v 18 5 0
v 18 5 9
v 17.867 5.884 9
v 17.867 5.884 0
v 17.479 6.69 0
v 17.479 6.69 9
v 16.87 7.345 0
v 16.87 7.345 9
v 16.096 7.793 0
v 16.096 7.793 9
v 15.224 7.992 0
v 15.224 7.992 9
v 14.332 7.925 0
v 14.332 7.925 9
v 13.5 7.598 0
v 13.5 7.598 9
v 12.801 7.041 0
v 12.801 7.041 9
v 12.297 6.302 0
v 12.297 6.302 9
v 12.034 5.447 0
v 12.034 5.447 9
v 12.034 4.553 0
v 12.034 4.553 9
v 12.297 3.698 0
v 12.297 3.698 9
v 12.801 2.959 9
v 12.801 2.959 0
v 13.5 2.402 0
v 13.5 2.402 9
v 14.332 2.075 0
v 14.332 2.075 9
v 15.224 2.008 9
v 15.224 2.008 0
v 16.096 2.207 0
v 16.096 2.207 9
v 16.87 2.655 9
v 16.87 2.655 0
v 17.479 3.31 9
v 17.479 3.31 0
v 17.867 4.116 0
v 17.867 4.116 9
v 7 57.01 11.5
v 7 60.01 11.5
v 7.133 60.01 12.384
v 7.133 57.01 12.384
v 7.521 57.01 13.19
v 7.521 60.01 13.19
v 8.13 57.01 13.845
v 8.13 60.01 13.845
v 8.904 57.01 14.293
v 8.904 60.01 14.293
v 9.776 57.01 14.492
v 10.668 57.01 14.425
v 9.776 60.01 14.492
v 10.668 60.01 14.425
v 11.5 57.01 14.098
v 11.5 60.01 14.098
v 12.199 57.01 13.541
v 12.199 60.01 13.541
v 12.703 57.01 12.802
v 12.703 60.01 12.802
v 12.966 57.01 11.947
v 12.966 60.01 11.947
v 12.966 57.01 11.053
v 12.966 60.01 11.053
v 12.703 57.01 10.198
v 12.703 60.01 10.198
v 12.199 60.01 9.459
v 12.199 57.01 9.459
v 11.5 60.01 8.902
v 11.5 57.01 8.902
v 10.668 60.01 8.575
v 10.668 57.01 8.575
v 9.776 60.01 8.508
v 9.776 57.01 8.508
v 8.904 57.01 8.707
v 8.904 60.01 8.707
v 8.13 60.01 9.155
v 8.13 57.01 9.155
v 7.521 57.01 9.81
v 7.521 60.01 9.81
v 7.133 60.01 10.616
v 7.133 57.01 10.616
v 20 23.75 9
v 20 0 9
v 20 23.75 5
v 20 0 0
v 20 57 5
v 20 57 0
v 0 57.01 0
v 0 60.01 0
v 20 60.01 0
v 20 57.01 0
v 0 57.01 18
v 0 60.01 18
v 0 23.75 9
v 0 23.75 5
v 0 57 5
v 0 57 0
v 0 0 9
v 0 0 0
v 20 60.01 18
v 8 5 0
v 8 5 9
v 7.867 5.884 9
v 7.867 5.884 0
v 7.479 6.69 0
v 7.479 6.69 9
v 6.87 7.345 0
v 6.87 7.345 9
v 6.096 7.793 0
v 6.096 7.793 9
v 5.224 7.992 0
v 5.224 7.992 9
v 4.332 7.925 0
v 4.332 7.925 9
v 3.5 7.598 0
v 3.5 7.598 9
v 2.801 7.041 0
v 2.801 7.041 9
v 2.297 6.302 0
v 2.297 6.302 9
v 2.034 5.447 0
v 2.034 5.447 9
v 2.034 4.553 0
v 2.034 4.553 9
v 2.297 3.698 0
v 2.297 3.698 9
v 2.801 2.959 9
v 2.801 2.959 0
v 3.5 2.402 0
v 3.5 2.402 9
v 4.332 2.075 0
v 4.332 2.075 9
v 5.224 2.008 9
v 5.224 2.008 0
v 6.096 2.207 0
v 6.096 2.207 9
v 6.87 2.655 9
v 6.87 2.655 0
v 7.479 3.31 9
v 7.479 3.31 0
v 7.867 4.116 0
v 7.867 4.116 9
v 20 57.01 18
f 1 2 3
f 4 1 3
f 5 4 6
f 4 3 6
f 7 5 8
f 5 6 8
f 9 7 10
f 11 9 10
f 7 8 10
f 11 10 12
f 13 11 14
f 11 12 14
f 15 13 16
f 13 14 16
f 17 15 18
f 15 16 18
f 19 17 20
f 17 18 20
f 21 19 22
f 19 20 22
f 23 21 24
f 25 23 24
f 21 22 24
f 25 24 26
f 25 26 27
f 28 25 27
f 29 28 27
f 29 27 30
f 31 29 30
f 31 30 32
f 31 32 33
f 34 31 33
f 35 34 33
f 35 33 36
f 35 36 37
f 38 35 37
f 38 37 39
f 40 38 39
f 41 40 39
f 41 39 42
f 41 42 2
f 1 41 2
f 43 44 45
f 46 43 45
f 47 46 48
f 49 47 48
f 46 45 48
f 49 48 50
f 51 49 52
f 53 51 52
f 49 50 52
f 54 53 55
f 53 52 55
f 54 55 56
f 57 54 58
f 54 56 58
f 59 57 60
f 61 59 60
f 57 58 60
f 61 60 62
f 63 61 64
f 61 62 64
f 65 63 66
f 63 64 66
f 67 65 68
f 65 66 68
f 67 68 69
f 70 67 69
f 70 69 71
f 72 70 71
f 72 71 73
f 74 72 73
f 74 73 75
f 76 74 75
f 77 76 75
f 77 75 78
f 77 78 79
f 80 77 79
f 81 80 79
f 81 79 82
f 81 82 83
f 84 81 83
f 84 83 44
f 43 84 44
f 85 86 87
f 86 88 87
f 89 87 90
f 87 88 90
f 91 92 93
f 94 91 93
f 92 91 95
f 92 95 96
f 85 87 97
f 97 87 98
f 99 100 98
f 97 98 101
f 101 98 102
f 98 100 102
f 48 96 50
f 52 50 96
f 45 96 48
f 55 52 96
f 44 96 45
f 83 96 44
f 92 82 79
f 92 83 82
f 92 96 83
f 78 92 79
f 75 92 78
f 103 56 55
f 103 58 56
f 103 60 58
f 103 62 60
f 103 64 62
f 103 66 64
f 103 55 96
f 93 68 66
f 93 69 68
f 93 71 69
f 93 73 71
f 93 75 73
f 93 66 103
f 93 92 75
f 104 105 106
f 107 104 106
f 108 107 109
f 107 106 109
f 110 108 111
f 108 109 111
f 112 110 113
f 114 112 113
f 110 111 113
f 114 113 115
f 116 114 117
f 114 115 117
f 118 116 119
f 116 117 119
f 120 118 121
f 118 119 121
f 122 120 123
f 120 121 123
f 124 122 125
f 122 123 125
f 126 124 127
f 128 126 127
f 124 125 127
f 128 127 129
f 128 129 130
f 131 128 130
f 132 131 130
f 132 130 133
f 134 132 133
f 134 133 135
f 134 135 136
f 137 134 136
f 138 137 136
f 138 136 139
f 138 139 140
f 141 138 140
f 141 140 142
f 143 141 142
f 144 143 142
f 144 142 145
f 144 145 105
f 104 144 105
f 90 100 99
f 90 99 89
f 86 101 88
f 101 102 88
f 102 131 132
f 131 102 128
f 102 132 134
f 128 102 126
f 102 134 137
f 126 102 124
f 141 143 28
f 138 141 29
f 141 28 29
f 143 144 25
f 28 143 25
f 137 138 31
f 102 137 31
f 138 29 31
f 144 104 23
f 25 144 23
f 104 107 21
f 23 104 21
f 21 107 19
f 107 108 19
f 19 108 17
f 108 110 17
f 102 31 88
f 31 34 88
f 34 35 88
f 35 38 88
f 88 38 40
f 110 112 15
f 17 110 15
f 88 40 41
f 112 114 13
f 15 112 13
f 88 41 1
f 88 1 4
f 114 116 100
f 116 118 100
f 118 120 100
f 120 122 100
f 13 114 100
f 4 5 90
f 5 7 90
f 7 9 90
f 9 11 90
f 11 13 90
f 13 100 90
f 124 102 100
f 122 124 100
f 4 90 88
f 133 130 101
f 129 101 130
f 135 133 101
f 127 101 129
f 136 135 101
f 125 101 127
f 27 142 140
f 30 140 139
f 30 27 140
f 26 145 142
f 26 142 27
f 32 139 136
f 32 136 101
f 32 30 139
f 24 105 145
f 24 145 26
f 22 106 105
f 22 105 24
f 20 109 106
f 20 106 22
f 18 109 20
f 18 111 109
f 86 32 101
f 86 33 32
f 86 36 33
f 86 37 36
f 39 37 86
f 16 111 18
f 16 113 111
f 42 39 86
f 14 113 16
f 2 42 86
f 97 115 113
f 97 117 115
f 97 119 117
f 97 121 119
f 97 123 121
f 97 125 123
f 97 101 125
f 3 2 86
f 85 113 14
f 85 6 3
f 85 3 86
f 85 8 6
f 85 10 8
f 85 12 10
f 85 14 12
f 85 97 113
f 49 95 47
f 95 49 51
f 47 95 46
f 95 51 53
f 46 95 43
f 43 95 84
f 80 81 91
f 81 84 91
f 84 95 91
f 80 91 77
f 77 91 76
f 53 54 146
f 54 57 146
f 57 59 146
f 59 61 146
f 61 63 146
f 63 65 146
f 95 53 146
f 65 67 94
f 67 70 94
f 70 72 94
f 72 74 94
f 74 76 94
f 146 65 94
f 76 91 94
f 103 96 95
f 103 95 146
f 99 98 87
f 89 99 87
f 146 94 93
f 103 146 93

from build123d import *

# Parameters (mm, degrees)
F0_W     = 20
F0_H     = 57
F1_DEPTH = 5
F2_W     = 20
F2_H     = 3
F3_DEPTH = 18
F4_R     = 3
F5_DEPTH = 10
F7_DEPTH = 4
F8_R     = 3
F9_DEPTH = 25


with BuildPart() as f1:
    # F0 (on Top) → F1 (new body)
    with BuildSketch(Plane.XY):
        with Locations((10, 28.5)):
            Rectangle(F0_W, F0_H)
    extrude(amount=F1_DEPTH)

    # F6 (on face) → F7 (join)
    with BuildSketch(Plane.XY.offset(5)):
        Polygon((0, 23.75), (0, 0), (20, 0), (20, 13.944925), (20, 23.75), align=None)
    extrude(amount=F7_DEPTH)

    # F8 (on face) → F9 (cut)
    with BuildSketch(Plane.XY.offset(9)):
        with Locations((5, 5)):
            Circle(F8_R)
        with Locations((15, 5)):
            Circle(F8_R)
    extrude(amount=-F9_DEPTH, mode=Mode.SUBTRACT)


with BuildPart() as f3:
    # F2 (on Top) → F3 (new body)
    with BuildSketch(Plane.XY):
        with Locations((10, 58.510353)):
            Rectangle(F2_W, F2_H)
    extrude(amount=F3_DEPTH)

    # F4 (on face) → F5 (cut)
    with BuildSketch(Plane(origin=(0, 60.010353, 0), x_dir=(-1, 0, 0), z_dir=(0, 1, 0))):
        with Locations((-10, 11.5)):
            Circle(F4_R)
    extrude(amount=-F5_DEPTH, mode=Mode.SUBTRACT)


solid = Compound([f1.part, f3.part])
